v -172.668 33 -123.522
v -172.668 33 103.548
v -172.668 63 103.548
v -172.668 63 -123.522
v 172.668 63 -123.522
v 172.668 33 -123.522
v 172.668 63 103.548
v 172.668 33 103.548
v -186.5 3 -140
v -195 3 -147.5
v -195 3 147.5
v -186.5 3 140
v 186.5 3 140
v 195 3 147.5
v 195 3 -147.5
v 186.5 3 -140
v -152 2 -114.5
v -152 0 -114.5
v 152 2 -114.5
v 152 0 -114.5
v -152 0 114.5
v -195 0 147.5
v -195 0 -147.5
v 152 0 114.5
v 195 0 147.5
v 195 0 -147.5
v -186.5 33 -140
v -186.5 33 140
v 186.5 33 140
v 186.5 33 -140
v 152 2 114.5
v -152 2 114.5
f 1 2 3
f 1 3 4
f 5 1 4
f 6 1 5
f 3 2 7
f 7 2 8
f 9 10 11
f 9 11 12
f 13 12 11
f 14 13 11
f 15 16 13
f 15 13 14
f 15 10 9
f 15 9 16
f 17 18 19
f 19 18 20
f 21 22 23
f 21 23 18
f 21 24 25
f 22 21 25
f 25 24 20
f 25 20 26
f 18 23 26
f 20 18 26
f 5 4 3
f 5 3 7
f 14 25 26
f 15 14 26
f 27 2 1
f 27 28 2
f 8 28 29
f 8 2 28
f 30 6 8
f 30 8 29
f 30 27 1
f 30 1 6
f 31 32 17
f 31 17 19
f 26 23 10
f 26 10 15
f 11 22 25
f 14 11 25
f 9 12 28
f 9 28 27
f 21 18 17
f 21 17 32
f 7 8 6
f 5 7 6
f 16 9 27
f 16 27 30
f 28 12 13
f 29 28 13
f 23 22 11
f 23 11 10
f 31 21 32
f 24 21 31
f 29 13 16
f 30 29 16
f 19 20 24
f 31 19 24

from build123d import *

# Parameters (mm, degrees)
SKETCH_1_W          = 390
SKETCH_1_H          = 295
EXTRUDE_1_DEPTH     = 3
SKETCH_2_W          = 373
SKETCH_2_H          = 280
EXTRUDE_2_DEPTH     = 30
SKETCH_4_W          = 345.33527023
SKETCH_4_H          = 227.069766727
EXTRUDE_3_DEPTH     = 30
SKETCH_5_W          = 304
SKETCH_5_H          = 229
CUT_EXTRUDE_4_DEPTH = 2


with BuildPart() as part:
    # 草图1 → 拉伸1 (new body)
    with BuildSketch(Plane(origin=(0, 0, 0), x_dir=(1, 0, 0), z_dir=(0, 1, 0))):
        Rectangle(SKETCH_1_W, SKETCH_1_H)
    extrude(amount=EXTRUDE_1_DEPTH)

    # 草图2 → 拉伸2 (add)
    with BuildSketch(Plane(origin=(0, 3, 0), x_dir=(1, 0, 0), z_dir=(0, 1, 0))):
        Rectangle(SKETCH_2_W, SKETCH_2_H)
    extrude(amount=EXTRUDE_2_DEPTH)

    # 草图4 → 拉伸3 (add)
    with BuildSketch(Plane(origin=(0, 33, 0), x_dir=(1, 0, 0), z_dir=(0, 1, 0))):
        with Locations((0, 9.986864741)):
            Rectangle(SKETCH_4_W, SKETCH_4_H)
    extrude(amount=EXTRUDE_3_DEPTH)

    # 草图5 → 拉伸4 (cut)
    with BuildSketch(Plane.XZ):
        Rectangle(SKETCH_5_W, SKETCH_5_H)
    extrude(amount=-CUT_EXTRUDE_4_DEPTH, mode=Mode.SUBTRACT)


solid = part.part
